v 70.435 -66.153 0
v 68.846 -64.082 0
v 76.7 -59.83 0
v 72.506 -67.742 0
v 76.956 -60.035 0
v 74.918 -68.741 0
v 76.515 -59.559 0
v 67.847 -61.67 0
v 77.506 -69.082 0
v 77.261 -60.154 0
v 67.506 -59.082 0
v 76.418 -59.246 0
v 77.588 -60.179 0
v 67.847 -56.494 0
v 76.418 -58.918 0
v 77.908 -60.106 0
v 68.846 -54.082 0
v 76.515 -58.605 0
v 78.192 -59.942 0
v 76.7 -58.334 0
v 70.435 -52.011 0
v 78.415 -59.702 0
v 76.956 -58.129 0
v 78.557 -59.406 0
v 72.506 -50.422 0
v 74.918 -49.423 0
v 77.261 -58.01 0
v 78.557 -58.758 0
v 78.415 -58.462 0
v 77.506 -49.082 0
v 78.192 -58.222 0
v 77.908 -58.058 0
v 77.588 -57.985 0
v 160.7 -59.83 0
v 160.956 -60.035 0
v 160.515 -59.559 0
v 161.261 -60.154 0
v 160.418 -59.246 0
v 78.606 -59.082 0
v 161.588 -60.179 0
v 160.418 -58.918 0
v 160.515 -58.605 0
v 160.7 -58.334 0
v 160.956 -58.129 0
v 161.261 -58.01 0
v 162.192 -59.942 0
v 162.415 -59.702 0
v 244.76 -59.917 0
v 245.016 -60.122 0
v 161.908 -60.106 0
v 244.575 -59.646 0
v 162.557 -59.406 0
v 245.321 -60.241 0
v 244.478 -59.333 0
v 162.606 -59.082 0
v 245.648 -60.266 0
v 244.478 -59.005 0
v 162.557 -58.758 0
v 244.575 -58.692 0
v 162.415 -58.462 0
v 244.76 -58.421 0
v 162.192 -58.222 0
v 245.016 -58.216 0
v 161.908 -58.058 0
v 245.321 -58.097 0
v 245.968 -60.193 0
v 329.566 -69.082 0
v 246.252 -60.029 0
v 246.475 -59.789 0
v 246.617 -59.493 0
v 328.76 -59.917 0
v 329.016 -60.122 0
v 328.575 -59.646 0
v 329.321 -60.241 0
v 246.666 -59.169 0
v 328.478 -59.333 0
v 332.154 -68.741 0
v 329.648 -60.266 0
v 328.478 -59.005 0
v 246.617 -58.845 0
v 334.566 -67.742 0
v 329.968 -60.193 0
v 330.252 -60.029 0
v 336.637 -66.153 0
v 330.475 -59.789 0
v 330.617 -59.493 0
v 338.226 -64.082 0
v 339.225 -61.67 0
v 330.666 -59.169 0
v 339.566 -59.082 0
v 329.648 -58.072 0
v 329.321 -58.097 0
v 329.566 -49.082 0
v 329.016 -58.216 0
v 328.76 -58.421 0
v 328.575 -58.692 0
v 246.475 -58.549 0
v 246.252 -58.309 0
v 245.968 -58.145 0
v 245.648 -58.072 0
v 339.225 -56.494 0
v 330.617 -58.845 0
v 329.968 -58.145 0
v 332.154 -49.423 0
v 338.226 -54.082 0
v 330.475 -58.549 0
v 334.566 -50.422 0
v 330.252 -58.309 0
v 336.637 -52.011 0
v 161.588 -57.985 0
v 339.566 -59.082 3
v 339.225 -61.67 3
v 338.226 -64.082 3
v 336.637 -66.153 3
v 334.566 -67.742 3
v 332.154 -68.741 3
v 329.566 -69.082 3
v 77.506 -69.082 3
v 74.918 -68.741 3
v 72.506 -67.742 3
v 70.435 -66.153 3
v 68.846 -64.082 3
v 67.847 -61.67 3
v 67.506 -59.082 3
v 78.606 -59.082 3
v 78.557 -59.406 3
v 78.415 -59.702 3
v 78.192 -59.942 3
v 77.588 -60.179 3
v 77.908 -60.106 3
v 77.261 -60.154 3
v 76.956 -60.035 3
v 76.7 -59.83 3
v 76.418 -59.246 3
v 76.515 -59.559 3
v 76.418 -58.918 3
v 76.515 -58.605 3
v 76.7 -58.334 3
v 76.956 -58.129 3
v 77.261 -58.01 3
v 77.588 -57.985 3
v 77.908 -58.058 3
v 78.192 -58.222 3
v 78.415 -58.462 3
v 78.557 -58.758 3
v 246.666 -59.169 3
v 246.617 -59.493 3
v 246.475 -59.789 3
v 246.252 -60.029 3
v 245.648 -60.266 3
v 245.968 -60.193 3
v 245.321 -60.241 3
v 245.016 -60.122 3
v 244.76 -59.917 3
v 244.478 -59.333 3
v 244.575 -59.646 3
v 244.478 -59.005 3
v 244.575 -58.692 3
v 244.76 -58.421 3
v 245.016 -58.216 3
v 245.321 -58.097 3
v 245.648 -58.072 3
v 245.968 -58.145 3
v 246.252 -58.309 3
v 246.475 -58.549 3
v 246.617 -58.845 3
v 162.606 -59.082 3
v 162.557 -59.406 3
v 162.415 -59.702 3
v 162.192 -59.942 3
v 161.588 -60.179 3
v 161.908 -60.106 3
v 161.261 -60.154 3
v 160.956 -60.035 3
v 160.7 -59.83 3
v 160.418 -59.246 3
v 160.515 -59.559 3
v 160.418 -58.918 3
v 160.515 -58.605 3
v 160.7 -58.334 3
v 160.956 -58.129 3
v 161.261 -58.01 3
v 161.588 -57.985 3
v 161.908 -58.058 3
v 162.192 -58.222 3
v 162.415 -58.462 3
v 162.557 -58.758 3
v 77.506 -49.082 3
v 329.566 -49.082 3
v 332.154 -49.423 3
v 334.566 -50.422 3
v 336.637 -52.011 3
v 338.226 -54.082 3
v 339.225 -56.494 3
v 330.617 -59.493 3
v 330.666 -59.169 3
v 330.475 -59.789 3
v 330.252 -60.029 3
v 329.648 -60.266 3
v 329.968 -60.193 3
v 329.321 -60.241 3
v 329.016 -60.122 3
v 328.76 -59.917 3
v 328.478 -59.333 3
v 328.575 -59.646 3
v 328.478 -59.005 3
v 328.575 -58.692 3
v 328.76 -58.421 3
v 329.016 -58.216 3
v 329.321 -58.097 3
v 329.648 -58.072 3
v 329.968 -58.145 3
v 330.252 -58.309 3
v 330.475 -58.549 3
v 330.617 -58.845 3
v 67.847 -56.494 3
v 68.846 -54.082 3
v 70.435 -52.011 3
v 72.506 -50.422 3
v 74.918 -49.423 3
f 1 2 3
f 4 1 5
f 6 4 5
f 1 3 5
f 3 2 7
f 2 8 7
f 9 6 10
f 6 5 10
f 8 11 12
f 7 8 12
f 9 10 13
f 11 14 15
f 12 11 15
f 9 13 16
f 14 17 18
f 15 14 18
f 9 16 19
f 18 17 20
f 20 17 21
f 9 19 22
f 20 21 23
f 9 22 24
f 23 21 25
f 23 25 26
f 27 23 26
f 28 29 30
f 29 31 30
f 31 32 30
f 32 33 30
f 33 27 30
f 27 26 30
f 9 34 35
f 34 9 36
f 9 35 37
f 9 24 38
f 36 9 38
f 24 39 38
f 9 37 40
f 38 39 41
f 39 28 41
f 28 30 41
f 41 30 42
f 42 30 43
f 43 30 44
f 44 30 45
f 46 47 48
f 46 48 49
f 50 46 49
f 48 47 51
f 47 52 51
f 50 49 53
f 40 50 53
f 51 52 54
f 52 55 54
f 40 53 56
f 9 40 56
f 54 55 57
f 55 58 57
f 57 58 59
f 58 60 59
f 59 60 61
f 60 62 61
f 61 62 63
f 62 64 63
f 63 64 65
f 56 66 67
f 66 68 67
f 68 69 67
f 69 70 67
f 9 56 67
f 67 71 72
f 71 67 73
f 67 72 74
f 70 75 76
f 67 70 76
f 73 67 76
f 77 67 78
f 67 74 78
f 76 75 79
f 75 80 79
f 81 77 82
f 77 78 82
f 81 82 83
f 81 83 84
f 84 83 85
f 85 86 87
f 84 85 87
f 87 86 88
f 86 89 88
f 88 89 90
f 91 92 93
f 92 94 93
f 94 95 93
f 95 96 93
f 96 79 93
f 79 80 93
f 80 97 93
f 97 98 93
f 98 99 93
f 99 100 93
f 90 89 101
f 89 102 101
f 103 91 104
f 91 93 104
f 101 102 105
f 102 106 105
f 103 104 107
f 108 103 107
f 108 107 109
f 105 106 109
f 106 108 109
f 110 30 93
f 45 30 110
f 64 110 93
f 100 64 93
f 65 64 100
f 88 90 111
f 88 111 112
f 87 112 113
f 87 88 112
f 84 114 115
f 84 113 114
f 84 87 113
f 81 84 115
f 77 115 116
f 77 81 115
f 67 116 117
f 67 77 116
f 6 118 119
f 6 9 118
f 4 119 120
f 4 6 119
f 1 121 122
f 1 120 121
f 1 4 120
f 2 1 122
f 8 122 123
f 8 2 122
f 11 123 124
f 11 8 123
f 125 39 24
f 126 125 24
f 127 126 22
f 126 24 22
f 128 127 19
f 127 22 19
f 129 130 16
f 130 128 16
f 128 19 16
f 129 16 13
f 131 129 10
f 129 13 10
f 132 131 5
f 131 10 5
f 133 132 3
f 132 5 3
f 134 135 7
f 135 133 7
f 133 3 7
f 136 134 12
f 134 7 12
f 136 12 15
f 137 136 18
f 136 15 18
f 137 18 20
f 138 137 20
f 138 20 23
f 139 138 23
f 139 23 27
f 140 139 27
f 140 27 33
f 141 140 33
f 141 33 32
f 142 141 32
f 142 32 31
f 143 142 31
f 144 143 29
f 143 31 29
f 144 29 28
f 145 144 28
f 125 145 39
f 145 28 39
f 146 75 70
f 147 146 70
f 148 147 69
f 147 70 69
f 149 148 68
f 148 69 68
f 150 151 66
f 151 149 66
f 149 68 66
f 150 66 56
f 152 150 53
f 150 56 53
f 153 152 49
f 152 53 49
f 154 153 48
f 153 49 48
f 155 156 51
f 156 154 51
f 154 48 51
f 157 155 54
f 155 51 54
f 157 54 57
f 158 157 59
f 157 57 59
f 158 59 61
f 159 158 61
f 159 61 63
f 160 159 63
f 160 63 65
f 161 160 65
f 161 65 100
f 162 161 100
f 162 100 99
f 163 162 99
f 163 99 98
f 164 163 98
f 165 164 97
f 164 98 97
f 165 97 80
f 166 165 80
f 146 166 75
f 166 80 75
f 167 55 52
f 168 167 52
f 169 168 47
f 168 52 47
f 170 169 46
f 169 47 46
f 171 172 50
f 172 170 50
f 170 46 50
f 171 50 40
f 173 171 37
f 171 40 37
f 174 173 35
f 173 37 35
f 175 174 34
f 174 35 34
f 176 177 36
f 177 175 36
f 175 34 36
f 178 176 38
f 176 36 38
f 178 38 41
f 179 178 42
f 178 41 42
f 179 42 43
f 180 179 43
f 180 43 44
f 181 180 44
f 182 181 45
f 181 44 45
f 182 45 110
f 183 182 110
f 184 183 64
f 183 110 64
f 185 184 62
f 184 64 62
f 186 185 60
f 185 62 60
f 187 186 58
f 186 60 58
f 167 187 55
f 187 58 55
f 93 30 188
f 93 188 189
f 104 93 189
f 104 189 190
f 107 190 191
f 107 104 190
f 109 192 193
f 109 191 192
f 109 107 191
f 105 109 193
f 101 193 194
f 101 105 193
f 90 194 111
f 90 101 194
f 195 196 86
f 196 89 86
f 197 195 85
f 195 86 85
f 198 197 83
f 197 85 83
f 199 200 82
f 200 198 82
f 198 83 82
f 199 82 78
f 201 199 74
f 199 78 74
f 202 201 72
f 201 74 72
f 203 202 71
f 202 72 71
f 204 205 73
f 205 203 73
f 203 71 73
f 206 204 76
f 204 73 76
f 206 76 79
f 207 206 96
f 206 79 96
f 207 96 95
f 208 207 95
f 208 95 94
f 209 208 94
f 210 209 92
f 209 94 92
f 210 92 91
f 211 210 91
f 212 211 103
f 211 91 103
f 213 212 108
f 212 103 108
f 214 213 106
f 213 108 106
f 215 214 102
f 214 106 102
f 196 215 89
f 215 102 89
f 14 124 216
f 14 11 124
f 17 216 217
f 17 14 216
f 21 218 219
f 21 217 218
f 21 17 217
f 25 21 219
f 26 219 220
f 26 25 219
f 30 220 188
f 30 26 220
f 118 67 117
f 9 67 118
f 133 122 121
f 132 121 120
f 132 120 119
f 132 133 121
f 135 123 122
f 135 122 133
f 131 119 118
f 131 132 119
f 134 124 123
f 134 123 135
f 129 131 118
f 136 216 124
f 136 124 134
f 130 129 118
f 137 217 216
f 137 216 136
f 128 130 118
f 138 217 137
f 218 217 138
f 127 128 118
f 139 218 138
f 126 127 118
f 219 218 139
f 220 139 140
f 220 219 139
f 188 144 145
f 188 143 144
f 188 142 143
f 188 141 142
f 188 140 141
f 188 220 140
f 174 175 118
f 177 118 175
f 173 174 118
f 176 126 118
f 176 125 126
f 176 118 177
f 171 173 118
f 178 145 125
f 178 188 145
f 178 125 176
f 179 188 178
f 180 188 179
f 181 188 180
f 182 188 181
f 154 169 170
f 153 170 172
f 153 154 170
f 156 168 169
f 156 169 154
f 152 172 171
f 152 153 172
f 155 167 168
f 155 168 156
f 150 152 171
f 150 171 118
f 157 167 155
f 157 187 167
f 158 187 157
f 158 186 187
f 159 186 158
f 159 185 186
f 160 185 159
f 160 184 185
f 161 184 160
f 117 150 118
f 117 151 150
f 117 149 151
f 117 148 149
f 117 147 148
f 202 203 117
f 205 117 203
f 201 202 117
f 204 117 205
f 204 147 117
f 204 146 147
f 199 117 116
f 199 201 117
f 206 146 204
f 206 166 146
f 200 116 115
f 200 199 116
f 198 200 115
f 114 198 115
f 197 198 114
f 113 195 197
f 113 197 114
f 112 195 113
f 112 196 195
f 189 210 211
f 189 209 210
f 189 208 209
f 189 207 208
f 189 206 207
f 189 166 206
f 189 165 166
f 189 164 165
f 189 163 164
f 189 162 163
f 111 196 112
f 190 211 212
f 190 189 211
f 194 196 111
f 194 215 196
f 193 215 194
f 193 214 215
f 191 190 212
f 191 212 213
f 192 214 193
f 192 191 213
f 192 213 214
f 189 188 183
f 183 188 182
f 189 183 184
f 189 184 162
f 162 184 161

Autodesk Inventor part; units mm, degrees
ref_plane "YZ Plane" through (0, 0, 0) normal (1, 0, 0) x (0, 1, 0)
ref_plane "XZ Plane" through (0, 0, 0) normal (0, 1, 0) x (-1, 0, 0)
ref_plane "XY Plane" through (0, 0, 0) normal (0, 0, 1) x (1, 0, 0)
ref_plane "Work Plane2" through (35.545, -31.609, 1.6) normal (0, 0, 1) x (1, 0, 0)
sketch "Sketch2" plane through (35.545, -31.609, 1.6) normal (0, 0, 1) x (1, 0, 0)
  line L0 (-4.7778, 3.1171) -> (341.5466, 3.1925) construction
  line L1 (341.5466, 3.1925) -> (341.5765, -133.848) construction
  line L2 (341.5765, -133.848) -> (-4.7479, -133.9235) construction
  line L3 (-4.7479, -133.9235) -> (-4.7778, 3.1171) construction
  point P0 (-35.545, 31.609)
ref_plane "Work Plane1" through (371.545, -162.609, 0) normal (0, 0, -1) x (-1, 0, 0)
sketch "Sketch9" plane through (371.545, -162.609, 0) normal (0, 0, -1) x (-1, 0, 0)
  line L0 (336, 131) -> (0, 131) projected
  line L1 (-2, 129) -> (-2, 2) projected
  line L2 (-1.9796, 129.2846) -> (-2, 129) projected
  line L3 (-1.919, 129.5635) -> (-1.9796, 129.2846) projected
  line L4 (-1.8193, 129.8308) -> (-1.919, 129.5635) projected
  line L5 (-1.6825, 130.0813) -> (-1.8193, 129.8308) projected
  line L6 (-1.5115, 130.3097) -> (-1.6825, 130.0813) projected
  line L7 (-1.3097, 130.5115) -> (-1.5115, 130.3097) projected
  line L8 (-1.0813, 130.6825) -> (-1.3097, 130.5115) projected
  line L9 (-0.8308, 130.8193) -> (-1.0813, 130.6825) projected
  line L10 (-0.5635, 130.919) -> (-0.8308, 130.8193) projected
  line L11 (-0.2846, 130.9796) -> (-0.5635, 130.919) projected
  line L12 (0, 131) -> (-0.2846, 130.9796) projected
  circle A0 centre (2.362, 128.645) radius 1.1 projected
  circle A1 centre (68.695, 128.645) radius 1.1 projected
  circle A2 centre (135.028, 128.645) radius 1.1 projected
  circle A3 centre (201.361, 128.645) radius 1.1 projected
  circle A4 centre (267.694, 128.645) radius 1.1 projected
  circle A5 centre (334.027, 128.645) radius 1.1 projected
  line L13 (338, 2) -> (338, 129) projected
  line L14 (338, 129) -> (337.9796, 129.2846) projected
  line L15 (337.9796, 129.2846) -> (337.919, 129.5635) projected
  line L16 (337.919, 129.5635) -> (337.8193, 129.8308) projected
  line L17 (337.8193, 129.8308) -> (337.6825, 130.0813) projected
  line L18 (337.6825, 130.0813) -> (337.5115, 130.3097) projected
  line L19 (337.5115, 130.3097) -> (337.3097, 130.5115) projected
  line L20 (337.3097, 130.5115) -> (337.0813, 130.6825) projected
  line L21 (337.0813, 130.6825) -> (336.8308, 130.8193) projected
  line L22 (336.8308, 130.8193) -> (336.5635, 130.919) projected
  line L23 (336.5635, 130.919) -> (336.2846, 130.9796) projected
  line L24 (336.2846, 130.9796) -> (336, 131) projected
  line L25 (0, 0) -> (336, 0) projected
  line L26 (336, 0) -> (336.2846, 0.0204) projected
  line L27 (336.2846, 0.0204) -> (336.5635, 0.081) projected
  line L28 (336.5635, 0.081) -> (336.8308, 0.1807) projected
  line L29 (336.8308, 0.1807) -> (337.0813, 0.3175) projected
  line L30 (337.0813, 0.3175) -> (337.3097, 0.4885) projected
  line L31 (337.3097, 0.4885) -> (337.5115, 0.6903) projected
  line L32 (337.5115, 0.6903) -> (337.6825, 0.9187) projected
  line L33 (337.6825, 0.9187) -> (337.8193, 1.1692) projected
  line L34 (337.8193, 1.1692) -> (337.919, 1.4365) projected
  line L35 (337.919, 1.4365) -> (337.9796, 1.7154) projected
  line L36 (337.9796, 1.7154) -> (338, 2) projected
  circle A6 centre (334.02, 2.37) radius 1.1 projected
  circle A7 centre (267.687, 2.37) radius 1.1 projected
  circle A8 centre (201.354, 2.37) radius 1.1 projected
  circle A9 centre (135.021, 2.37) radius 1.1 projected
  circle A10 centre (68.688, 2.37) radius 1.1 projected
  circle A11 centre (2.355, 2.37) radius 1.1 projected
  line L37 (-0.2846, 0.0204) -> (0, 0) projected
  line L38 (-0.5635, 0.081) -> (-0.2846, 0.0204) projected
  line L39 (-0.8308, 0.1807) -> (-0.5635, 0.081) projected
  line L40 (-1.0813, 0.3175) -> (-0.8308, 0.1807) projected
  line L41 (-1.3097, 0.4885) -> (-1.0813, 0.3175) projected
  line L42 (-1.5115, 0.6903) -> (-1.3097, 0.4885) projected
  line L43 (-1.6825, 0.9187) -> (-1.5115, 0.6903) projected
  line L44 (-1.8193, 1.1692) -> (-1.6825, 0.9187) projected
  line L45 (-1.919, 1.4365) -> (-1.8193, 1.1692) projected
  line L46 (-1.9796, 1.7154) -> (-1.919, 1.4365) projected
  line L47 (-2, 2) -> (-1.9796, 1.7154) projected
  circle A12 centre (41.979, 103.44) radius 1.1 projected
  circle A13 centre (125.979, 103.44) radius 1.1 projected
  circle A14 centre (210.039, 103.527) radius 1.1 projected
  circle A15 centre (294.039, 103.527) radius 1.1 projected
  point P0 (371.545, 162.609)
ref_plane "Work Plane3" through (371.545, -162.609, 0) normal (0, 0, 1) x (1, 0, 0)
sketch "Sketch10" plane through (371.545, -162.609, 0) normal (0, 0, 1) x (1, 0, 0)
  circle A0 centre (-294.039, 103.527) radius 1.1 projected
  circle A1 centre (-210.039, 103.527) radius 1.1 projected
  circle A2 centre (-125.979, 103.44) radius 1.1 projected
  circle A3 centre (-41.979, 103.44) radius 1.1 projected
  line L0 (-294.039, 113.527) -> (-41.979, 113.527)
  line L1 (-31.979, 103.527) -> (-31.979, 103.527)
  line L2 (-41.979, 93.527) -> (-294.039, 93.527)
  line L3 (-304.039, 103.527) -> (-304.039, 103.527)
  arc A4 (-31.979, 103.527) -> (-41.979, 113.527) centre (-41.979, 103.527) ccw
  arc A5 (-41.979, 93.527) -> (-31.979, 103.527) centre (-41.979, 103.527) ccw
  arc A6 (-294.039, 113.527) -> (-304.039, 103.527) centre (-294.039, 103.527) ccw
  arc A7 (-304.039, 103.527) -> (-294.039, 93.527) centre (-294.039, 103.527) ccw
  point P0 (-371.545, 162.609)
  point P1 (-31.979, 103.527)
  dimension "d89" = 10
  dimension "d90" = 10
  dimension "d91" = 10
  dimension "d92" = 10
  dimension "d93" = 10
extrude "Extrusion4" add sketch "Sketch10" along normal blind 3
properties part number "foot4"
